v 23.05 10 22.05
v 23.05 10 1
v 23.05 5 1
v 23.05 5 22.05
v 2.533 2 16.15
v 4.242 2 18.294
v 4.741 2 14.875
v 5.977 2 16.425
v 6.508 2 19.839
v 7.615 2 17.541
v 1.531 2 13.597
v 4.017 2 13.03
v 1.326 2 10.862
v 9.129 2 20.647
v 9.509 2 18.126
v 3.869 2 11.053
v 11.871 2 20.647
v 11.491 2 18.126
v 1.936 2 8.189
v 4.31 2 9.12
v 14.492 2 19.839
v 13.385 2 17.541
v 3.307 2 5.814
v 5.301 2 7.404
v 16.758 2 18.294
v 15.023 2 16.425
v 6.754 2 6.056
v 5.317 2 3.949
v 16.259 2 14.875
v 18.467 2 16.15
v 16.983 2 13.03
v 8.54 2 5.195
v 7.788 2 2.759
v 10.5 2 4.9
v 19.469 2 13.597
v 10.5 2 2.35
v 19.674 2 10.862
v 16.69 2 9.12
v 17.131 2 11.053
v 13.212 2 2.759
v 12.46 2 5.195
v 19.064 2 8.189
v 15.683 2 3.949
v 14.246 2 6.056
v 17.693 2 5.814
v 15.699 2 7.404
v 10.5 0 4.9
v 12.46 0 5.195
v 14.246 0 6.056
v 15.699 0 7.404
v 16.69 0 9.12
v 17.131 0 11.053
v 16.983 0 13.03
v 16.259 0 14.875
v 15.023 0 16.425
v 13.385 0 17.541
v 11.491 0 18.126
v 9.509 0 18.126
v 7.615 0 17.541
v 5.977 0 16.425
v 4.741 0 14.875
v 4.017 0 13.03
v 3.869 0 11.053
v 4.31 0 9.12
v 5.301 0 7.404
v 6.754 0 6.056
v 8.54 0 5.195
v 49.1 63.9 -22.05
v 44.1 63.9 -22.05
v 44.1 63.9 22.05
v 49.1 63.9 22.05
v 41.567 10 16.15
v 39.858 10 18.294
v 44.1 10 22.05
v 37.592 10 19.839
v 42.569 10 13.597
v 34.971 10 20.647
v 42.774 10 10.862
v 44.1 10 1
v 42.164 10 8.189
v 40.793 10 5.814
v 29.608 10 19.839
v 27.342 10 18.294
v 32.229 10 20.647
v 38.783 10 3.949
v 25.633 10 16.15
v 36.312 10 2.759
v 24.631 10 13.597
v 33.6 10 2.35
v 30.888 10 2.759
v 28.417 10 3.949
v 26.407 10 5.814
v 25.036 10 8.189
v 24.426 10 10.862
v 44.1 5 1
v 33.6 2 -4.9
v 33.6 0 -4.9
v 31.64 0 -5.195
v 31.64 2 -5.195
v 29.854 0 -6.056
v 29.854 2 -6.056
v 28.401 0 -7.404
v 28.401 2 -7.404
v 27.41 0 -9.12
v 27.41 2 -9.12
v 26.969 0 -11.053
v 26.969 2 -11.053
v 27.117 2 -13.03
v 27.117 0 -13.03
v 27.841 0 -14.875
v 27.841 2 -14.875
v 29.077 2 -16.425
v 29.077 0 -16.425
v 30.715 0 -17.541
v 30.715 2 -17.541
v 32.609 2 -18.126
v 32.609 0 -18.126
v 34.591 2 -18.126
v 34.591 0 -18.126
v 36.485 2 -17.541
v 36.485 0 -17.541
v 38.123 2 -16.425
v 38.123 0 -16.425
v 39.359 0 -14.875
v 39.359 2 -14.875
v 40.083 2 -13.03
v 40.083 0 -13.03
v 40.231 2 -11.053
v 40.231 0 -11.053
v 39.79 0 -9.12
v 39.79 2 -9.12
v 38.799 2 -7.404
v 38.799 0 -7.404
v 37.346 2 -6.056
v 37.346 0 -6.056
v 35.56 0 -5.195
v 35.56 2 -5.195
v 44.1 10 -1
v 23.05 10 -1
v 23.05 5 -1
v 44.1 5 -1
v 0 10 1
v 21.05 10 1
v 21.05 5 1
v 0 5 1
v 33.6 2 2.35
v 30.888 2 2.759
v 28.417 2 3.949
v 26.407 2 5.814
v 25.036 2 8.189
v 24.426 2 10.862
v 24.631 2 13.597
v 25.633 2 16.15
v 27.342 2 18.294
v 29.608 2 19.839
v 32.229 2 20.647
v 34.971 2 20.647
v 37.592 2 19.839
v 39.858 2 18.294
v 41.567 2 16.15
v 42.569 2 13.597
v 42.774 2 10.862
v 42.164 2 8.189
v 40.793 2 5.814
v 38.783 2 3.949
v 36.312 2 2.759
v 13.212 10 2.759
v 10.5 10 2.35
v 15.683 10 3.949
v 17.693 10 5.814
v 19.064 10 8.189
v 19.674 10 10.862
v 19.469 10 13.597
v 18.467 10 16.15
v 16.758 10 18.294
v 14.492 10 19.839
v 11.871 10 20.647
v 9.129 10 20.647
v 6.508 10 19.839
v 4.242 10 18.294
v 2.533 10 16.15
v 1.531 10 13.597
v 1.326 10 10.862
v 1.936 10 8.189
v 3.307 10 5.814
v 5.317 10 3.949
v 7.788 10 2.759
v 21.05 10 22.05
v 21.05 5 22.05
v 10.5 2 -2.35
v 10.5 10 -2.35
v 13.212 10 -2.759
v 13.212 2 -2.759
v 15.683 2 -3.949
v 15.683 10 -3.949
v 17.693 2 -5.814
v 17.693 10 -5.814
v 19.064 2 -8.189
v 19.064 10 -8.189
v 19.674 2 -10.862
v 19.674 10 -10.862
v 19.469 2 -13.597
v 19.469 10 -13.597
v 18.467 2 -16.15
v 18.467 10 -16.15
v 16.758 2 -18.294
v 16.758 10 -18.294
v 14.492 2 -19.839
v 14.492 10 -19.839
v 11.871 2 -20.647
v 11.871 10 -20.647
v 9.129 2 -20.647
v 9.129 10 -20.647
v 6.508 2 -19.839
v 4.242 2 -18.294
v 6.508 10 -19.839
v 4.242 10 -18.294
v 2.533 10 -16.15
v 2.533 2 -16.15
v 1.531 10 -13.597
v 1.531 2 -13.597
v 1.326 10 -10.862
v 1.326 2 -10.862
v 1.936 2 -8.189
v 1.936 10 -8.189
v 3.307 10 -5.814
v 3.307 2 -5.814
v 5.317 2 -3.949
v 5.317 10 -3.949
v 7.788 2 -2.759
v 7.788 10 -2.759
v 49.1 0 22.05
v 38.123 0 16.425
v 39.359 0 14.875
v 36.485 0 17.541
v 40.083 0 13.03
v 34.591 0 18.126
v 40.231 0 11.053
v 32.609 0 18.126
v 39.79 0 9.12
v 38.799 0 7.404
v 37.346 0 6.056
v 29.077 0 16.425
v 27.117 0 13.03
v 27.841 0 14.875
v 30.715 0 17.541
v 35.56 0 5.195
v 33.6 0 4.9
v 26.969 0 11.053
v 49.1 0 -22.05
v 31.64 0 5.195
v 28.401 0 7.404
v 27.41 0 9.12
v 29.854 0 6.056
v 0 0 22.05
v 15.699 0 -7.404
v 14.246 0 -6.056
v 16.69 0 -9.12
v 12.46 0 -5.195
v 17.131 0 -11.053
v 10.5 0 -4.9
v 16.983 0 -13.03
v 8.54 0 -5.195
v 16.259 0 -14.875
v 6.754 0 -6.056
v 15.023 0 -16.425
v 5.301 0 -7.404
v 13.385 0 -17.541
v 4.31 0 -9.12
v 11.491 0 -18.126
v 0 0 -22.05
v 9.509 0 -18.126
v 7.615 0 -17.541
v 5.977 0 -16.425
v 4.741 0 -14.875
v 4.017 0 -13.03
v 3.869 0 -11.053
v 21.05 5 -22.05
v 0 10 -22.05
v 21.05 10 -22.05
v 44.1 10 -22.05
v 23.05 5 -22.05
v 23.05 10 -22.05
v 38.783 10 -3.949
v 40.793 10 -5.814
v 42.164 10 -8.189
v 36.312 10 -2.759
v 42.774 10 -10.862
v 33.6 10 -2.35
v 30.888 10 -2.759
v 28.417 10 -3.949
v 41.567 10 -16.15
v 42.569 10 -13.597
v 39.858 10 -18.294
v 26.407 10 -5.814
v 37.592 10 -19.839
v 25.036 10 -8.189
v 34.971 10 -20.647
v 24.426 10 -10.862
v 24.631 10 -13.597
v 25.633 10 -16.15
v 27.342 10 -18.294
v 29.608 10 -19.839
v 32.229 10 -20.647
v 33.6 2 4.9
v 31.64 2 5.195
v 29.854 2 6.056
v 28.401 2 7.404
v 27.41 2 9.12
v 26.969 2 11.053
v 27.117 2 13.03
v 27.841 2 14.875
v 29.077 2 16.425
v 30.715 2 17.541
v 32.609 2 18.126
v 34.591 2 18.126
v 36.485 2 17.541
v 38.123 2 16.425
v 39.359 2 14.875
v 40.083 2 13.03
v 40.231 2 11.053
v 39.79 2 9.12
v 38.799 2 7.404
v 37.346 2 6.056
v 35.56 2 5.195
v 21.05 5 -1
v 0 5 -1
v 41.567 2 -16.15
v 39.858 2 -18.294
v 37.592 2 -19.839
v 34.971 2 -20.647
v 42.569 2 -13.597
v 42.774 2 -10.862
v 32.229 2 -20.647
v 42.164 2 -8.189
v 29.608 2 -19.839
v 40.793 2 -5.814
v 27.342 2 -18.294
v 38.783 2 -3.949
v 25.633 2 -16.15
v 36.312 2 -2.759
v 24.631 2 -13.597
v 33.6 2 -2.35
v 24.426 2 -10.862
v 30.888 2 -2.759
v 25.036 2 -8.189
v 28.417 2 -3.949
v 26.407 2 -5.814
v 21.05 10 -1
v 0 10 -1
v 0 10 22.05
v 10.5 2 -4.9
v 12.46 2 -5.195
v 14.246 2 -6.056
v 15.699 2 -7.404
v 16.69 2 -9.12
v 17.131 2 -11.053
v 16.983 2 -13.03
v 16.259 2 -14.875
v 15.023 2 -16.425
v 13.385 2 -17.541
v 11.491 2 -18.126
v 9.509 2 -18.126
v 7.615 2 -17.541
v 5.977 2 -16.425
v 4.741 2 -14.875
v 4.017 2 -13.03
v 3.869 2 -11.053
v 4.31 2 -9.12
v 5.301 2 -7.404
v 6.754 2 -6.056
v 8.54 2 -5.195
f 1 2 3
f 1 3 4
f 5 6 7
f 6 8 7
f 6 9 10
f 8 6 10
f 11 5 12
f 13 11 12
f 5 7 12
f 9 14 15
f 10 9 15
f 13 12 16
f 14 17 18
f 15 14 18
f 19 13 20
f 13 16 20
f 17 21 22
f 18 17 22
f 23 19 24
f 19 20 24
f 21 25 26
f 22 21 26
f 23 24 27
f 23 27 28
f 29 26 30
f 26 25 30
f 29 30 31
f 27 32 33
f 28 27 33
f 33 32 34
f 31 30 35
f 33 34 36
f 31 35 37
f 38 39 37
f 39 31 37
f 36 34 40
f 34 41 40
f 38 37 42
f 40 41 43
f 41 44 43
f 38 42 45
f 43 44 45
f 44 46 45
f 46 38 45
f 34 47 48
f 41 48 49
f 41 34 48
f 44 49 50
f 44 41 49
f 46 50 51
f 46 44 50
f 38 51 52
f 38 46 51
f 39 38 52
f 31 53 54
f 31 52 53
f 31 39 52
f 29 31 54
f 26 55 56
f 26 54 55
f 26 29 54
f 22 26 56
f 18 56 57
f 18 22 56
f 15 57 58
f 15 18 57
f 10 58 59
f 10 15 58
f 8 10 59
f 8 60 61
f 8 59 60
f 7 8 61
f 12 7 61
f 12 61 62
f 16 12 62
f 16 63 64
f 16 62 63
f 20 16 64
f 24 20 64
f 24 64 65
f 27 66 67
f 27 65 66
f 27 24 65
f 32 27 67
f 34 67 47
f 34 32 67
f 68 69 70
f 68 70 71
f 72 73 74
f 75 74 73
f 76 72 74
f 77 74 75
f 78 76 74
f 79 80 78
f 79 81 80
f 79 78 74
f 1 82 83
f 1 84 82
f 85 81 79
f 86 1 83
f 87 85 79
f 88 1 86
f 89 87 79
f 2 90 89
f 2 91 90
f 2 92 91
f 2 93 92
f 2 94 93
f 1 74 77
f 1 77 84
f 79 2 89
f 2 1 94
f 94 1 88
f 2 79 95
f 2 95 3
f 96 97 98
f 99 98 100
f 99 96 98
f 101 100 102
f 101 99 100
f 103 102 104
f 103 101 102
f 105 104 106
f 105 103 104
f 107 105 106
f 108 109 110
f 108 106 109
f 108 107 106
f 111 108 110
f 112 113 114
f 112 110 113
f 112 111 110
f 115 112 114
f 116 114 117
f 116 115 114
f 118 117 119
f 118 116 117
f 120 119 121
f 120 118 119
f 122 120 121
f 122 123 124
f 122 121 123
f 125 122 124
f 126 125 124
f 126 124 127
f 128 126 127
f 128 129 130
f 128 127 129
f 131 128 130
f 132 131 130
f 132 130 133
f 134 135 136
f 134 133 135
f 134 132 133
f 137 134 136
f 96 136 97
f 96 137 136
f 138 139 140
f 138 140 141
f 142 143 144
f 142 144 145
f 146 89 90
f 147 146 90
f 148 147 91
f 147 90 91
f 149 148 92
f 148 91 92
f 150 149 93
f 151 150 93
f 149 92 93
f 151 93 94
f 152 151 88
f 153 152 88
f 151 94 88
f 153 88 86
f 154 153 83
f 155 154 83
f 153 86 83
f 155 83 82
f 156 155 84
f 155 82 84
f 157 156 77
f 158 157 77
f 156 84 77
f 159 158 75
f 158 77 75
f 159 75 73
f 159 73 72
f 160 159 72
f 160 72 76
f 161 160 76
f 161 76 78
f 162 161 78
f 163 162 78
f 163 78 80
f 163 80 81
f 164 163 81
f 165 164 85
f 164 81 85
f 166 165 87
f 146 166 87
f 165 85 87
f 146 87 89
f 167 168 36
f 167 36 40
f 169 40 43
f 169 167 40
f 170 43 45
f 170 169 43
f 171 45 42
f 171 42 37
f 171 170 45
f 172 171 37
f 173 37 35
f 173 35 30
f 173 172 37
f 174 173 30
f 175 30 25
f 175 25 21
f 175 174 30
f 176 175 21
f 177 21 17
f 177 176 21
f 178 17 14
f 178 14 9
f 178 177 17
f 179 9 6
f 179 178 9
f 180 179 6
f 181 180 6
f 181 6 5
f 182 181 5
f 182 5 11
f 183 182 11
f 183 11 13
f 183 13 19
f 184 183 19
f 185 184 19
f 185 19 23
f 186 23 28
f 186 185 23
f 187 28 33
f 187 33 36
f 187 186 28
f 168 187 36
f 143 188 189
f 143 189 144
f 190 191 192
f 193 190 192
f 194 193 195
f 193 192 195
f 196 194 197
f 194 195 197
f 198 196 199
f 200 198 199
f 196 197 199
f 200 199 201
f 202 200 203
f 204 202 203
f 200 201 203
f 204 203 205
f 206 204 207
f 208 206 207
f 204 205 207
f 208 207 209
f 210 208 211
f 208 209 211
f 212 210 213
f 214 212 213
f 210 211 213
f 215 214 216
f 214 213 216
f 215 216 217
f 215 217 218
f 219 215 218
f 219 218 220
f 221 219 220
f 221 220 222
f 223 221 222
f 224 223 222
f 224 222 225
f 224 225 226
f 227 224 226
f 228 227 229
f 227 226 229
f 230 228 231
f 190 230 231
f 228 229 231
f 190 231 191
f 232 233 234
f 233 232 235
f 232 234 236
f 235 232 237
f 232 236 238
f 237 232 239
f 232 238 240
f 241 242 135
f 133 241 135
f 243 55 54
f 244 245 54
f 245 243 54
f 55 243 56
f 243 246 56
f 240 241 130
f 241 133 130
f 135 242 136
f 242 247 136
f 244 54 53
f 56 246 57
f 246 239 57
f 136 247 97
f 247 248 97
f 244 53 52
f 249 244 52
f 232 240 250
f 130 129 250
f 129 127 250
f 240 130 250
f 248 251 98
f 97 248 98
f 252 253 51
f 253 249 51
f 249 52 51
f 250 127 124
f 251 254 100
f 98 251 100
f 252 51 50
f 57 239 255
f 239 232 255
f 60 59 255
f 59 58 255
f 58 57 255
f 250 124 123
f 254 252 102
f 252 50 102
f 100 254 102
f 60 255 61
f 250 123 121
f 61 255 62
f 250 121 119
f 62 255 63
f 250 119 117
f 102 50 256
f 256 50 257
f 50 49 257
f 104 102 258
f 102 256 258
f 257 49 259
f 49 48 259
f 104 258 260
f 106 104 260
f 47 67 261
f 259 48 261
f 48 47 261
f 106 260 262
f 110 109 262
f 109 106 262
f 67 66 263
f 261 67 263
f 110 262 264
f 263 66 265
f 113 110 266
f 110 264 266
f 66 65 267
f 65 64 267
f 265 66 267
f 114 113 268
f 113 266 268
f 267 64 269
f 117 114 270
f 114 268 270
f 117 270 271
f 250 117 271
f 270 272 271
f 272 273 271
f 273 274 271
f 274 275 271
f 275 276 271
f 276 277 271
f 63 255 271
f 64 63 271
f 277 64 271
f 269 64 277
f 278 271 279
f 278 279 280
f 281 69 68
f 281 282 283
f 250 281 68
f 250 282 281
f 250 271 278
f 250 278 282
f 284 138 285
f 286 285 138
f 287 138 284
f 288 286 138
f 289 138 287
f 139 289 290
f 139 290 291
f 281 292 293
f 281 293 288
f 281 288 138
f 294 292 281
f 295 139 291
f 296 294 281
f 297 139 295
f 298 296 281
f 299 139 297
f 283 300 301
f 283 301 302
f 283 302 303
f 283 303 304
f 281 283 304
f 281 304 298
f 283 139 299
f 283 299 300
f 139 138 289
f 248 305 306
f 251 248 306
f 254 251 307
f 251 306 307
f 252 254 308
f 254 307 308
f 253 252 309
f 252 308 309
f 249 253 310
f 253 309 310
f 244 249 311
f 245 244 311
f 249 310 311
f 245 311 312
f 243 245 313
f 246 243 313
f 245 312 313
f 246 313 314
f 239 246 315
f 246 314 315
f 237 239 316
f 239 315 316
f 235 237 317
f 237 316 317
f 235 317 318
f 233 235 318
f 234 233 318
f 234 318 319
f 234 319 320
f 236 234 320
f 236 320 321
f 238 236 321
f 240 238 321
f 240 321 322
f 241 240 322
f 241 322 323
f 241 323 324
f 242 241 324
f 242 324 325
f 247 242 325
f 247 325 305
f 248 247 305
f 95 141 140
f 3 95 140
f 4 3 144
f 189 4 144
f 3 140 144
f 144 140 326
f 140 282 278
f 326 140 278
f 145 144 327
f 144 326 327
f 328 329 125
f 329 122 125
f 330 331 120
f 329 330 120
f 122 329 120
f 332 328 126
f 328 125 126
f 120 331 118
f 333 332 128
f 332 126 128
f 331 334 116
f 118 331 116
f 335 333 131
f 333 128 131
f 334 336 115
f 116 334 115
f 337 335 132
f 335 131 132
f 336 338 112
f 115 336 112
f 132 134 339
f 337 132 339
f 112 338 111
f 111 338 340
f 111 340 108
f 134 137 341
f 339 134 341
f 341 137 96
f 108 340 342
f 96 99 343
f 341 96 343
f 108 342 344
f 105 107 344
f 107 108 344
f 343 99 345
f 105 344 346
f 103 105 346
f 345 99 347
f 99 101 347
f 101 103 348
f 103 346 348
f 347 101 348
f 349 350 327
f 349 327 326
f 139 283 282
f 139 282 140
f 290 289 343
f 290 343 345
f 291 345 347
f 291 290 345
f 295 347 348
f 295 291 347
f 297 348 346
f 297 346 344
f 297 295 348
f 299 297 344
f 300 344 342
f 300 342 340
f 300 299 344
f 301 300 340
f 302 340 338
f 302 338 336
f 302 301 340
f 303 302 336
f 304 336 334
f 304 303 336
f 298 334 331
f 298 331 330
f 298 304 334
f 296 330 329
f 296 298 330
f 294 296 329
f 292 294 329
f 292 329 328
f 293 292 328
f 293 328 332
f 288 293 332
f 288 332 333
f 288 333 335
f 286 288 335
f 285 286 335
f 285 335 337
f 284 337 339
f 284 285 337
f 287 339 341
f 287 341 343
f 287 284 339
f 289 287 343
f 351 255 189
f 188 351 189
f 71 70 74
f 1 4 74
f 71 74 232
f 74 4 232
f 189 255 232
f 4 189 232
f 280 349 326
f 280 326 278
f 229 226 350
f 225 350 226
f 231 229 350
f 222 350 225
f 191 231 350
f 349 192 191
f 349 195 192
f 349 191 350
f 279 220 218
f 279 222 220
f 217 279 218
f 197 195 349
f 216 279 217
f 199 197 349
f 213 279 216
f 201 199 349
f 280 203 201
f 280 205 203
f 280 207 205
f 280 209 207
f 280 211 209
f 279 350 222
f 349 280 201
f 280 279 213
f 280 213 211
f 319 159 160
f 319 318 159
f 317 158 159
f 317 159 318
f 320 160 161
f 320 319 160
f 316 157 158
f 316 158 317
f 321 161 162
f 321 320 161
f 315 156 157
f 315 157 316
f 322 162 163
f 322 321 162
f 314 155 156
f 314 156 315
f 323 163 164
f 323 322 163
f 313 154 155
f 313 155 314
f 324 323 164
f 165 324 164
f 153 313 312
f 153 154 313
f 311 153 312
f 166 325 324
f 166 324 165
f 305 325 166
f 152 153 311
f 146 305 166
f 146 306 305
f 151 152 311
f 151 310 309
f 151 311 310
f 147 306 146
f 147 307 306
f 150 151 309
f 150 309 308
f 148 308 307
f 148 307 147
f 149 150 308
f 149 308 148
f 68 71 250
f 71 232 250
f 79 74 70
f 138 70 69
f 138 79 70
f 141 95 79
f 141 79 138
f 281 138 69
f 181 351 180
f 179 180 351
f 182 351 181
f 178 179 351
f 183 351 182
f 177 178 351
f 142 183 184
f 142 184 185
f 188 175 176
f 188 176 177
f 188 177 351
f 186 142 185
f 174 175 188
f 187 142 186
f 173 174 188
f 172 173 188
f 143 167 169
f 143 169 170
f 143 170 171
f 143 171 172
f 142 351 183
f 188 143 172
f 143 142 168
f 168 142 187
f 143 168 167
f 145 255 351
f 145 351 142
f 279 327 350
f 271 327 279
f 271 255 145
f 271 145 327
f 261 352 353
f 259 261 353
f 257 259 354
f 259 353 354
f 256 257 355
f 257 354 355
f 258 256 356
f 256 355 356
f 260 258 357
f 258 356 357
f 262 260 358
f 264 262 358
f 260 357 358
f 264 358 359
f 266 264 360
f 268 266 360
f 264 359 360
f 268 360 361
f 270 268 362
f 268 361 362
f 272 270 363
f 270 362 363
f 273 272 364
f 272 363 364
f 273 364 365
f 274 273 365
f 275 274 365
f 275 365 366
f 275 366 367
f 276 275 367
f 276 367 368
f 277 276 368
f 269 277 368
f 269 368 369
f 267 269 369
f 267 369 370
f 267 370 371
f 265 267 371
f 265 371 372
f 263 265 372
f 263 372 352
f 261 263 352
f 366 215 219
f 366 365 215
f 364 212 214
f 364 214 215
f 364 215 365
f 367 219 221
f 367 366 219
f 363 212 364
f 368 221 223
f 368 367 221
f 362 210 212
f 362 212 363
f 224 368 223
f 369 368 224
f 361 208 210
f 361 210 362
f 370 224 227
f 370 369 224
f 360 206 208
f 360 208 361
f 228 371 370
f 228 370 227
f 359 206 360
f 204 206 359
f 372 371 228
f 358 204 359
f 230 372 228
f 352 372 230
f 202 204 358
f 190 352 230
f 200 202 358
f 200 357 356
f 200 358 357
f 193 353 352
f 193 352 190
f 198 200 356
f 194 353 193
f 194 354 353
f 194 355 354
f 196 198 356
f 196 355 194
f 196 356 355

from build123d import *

# Parameters (mm, degrees)
SKETCH1_W               = 44.1
SKETCH1_H               = 44.1
BOSS_EXTRUDE1_DEPTH     = 10
SKETCH2_R               = 9.2
CUT_EXTRUDE1_DEPTH      = 8
SKETCH5_R               = 6.65
CUT_EXTRUDE4_DEPTH      = 50.9501001
MIRROR2_COPY_1_SKETCH_R = 9.2
MIRROR2_COPY_1_DEPTH    = 8
MIRROR2_COPY_2_SKETCH_R = 6.65
MIRROR2_COPY_2_DEPTH    = 50.9501001
CUT_EXTRUDE3_DEPTH      = 5
SKETCH6_W               = 44.1
SKETCH6_H               = 10
BOSS_EXTRUDE2_DEPTH     = 5
SKETCH7_W               = 5
SKETCH7_H               = 44.1
BOSS_EXTRUDE3_DEPTH     = 53.9


with BuildPart() as part:
    # Sketch1 → Boss-Extrude1 (new body)
    with BuildSketch(Plane(origin=(0, 0, 0), x_dir=(1, 0, 0), z_dir=(0, 1, 0))):
        with Locations((22.05, 0)):
            Rectangle(SKETCH1_W, SKETCH1_H)
    extrude(amount=BOSS_EXTRUDE1_DEPTH)

    # Sketch2 → Cut-Extrude1 (cut)
    with BuildSketch(Plane(origin=(0, 10, 0), x_dir=(1, 0, 0), z_dir=(0, 1, 0))):
        with Locations(Location((10.5, 11.55, 0), (0, 0, 270))):
            Circle(SKETCH2_R)
    cut_extrude1 = extrude(amount=-CUT_EXTRUDE1_DEPTH, mode=Mode.SUBTRACT)

    # Sketch5 → Cut-Extrude4 (cut, through all)
    with BuildSketch(Plane(origin=(0, 2, 0), x_dir=(1, 0, 0), z_dir=(0, 1, 0))):
        with Locations(Location((10.5, 11.55, 0), (0, 0, 270))):
            Circle(SKETCH5_R)
    cut_extrude4 = extrude(amount=-CUT_EXTRUDE4_DEPTH, mode=Mode.SUBTRACT)

    # Mirror1: Cut-Extrude1, Cut-Extrude4 across plane
    add(cut_extrude1.mirror(Plane.XY), mode=Mode.SUBTRACT)
    add(cut_extrude4.mirror(Plane.XY), mode=Mode.SUBTRACT)

    # Mirror2: Cut-Extrude1, Cut-Extrude4 across plane
    add(cut_extrude1.mirror(Plane(origin=(22.05, 0, 0), x_dir=(0, 0, 1), z_dir=(1, 0, 0))), mode=Mode.SUBTRACT)
    add(cut_extrude4.mirror(Plane(origin=(22.05, 0, 0), x_dir=(0, 0, 1), z_dir=(1, 0, 0))), mode=Mode.SUBTRACT)

    # Mirror2 copy 1 sketch → Mirror2 copy 1 (cut)
    with BuildSketch(Plane(origin=(44.1, 10, 0), x_dir=(-1, 0, 0), z_dir=(0, 1, 0))):
        with Locations(Location((10.5, 11.55, 0), (0, 0, 270))):
            Circle(MIRROR2_COPY_1_SKETCH_R)
    extrude(amount=-MIRROR2_COPY_1_DEPTH, mode=Mode.SUBTRACT)

    # Mirror2 copy 2 sketch → Mirror2 copy 2 (cut, through all)
    with BuildSketch(Plane(origin=(44.1, 2, 0), x_dir=(-1, 0, 0), z_dir=(0, 1, 0))):
        with Locations(Location((10.5, 11.55, 0), (0, 0, 270))):
            Circle(MIRROR2_COPY_2_SKETCH_R)
    extrude(amount=-MIRROR2_COPY_2_DEPTH, mode=Mode.SUBTRACT)

    # Sketch4 → Cut-Extrude3 (cut)
    with BuildSketch(Plane(origin=(0, 10, 0), x_dir=(1, 0, 0), z_dir=(0, 1, 0))):
        Polygon((21.05, 22.05), (23.05, 22.05), (23.05, 1), (46.251393124, 1), (46.251393124, -1), (23.05, -1), (23.05, -23.362709558), (21.05, -23.362709558), (21.05, -1), (0, -1), (0, 1), (21.05, 1), align=None)
    extrude(amount=-CUT_EXTRUDE3_DEPTH, mode=Mode.SUBTRACT)

    # Sketch6 → Boss-Extrude2 (add)
    with BuildSketch(Plane(origin=(44.1, 0, 0), x_dir=(0, 0, -1), z_dir=(1, 0, 0))):
        with Locations((0, 5)):
            Rectangle(SKETCH6_W, SKETCH6_H)
    extrude(amount=BOSS_EXTRUDE2_DEPTH)

    # Sketch7 → Boss-Extrude3 (add)
    with BuildSketch(Plane(origin=(0, 10, 0), x_dir=(1, 0, 0), z_dir=(0, 1, 0))):
        with Locations((46.6, 0)):
            Rectangle(SKETCH7_W, SKETCH7_H)
    extrude(amount=BOSS_EXTRUDE3_DEPTH)


solid = part.part
